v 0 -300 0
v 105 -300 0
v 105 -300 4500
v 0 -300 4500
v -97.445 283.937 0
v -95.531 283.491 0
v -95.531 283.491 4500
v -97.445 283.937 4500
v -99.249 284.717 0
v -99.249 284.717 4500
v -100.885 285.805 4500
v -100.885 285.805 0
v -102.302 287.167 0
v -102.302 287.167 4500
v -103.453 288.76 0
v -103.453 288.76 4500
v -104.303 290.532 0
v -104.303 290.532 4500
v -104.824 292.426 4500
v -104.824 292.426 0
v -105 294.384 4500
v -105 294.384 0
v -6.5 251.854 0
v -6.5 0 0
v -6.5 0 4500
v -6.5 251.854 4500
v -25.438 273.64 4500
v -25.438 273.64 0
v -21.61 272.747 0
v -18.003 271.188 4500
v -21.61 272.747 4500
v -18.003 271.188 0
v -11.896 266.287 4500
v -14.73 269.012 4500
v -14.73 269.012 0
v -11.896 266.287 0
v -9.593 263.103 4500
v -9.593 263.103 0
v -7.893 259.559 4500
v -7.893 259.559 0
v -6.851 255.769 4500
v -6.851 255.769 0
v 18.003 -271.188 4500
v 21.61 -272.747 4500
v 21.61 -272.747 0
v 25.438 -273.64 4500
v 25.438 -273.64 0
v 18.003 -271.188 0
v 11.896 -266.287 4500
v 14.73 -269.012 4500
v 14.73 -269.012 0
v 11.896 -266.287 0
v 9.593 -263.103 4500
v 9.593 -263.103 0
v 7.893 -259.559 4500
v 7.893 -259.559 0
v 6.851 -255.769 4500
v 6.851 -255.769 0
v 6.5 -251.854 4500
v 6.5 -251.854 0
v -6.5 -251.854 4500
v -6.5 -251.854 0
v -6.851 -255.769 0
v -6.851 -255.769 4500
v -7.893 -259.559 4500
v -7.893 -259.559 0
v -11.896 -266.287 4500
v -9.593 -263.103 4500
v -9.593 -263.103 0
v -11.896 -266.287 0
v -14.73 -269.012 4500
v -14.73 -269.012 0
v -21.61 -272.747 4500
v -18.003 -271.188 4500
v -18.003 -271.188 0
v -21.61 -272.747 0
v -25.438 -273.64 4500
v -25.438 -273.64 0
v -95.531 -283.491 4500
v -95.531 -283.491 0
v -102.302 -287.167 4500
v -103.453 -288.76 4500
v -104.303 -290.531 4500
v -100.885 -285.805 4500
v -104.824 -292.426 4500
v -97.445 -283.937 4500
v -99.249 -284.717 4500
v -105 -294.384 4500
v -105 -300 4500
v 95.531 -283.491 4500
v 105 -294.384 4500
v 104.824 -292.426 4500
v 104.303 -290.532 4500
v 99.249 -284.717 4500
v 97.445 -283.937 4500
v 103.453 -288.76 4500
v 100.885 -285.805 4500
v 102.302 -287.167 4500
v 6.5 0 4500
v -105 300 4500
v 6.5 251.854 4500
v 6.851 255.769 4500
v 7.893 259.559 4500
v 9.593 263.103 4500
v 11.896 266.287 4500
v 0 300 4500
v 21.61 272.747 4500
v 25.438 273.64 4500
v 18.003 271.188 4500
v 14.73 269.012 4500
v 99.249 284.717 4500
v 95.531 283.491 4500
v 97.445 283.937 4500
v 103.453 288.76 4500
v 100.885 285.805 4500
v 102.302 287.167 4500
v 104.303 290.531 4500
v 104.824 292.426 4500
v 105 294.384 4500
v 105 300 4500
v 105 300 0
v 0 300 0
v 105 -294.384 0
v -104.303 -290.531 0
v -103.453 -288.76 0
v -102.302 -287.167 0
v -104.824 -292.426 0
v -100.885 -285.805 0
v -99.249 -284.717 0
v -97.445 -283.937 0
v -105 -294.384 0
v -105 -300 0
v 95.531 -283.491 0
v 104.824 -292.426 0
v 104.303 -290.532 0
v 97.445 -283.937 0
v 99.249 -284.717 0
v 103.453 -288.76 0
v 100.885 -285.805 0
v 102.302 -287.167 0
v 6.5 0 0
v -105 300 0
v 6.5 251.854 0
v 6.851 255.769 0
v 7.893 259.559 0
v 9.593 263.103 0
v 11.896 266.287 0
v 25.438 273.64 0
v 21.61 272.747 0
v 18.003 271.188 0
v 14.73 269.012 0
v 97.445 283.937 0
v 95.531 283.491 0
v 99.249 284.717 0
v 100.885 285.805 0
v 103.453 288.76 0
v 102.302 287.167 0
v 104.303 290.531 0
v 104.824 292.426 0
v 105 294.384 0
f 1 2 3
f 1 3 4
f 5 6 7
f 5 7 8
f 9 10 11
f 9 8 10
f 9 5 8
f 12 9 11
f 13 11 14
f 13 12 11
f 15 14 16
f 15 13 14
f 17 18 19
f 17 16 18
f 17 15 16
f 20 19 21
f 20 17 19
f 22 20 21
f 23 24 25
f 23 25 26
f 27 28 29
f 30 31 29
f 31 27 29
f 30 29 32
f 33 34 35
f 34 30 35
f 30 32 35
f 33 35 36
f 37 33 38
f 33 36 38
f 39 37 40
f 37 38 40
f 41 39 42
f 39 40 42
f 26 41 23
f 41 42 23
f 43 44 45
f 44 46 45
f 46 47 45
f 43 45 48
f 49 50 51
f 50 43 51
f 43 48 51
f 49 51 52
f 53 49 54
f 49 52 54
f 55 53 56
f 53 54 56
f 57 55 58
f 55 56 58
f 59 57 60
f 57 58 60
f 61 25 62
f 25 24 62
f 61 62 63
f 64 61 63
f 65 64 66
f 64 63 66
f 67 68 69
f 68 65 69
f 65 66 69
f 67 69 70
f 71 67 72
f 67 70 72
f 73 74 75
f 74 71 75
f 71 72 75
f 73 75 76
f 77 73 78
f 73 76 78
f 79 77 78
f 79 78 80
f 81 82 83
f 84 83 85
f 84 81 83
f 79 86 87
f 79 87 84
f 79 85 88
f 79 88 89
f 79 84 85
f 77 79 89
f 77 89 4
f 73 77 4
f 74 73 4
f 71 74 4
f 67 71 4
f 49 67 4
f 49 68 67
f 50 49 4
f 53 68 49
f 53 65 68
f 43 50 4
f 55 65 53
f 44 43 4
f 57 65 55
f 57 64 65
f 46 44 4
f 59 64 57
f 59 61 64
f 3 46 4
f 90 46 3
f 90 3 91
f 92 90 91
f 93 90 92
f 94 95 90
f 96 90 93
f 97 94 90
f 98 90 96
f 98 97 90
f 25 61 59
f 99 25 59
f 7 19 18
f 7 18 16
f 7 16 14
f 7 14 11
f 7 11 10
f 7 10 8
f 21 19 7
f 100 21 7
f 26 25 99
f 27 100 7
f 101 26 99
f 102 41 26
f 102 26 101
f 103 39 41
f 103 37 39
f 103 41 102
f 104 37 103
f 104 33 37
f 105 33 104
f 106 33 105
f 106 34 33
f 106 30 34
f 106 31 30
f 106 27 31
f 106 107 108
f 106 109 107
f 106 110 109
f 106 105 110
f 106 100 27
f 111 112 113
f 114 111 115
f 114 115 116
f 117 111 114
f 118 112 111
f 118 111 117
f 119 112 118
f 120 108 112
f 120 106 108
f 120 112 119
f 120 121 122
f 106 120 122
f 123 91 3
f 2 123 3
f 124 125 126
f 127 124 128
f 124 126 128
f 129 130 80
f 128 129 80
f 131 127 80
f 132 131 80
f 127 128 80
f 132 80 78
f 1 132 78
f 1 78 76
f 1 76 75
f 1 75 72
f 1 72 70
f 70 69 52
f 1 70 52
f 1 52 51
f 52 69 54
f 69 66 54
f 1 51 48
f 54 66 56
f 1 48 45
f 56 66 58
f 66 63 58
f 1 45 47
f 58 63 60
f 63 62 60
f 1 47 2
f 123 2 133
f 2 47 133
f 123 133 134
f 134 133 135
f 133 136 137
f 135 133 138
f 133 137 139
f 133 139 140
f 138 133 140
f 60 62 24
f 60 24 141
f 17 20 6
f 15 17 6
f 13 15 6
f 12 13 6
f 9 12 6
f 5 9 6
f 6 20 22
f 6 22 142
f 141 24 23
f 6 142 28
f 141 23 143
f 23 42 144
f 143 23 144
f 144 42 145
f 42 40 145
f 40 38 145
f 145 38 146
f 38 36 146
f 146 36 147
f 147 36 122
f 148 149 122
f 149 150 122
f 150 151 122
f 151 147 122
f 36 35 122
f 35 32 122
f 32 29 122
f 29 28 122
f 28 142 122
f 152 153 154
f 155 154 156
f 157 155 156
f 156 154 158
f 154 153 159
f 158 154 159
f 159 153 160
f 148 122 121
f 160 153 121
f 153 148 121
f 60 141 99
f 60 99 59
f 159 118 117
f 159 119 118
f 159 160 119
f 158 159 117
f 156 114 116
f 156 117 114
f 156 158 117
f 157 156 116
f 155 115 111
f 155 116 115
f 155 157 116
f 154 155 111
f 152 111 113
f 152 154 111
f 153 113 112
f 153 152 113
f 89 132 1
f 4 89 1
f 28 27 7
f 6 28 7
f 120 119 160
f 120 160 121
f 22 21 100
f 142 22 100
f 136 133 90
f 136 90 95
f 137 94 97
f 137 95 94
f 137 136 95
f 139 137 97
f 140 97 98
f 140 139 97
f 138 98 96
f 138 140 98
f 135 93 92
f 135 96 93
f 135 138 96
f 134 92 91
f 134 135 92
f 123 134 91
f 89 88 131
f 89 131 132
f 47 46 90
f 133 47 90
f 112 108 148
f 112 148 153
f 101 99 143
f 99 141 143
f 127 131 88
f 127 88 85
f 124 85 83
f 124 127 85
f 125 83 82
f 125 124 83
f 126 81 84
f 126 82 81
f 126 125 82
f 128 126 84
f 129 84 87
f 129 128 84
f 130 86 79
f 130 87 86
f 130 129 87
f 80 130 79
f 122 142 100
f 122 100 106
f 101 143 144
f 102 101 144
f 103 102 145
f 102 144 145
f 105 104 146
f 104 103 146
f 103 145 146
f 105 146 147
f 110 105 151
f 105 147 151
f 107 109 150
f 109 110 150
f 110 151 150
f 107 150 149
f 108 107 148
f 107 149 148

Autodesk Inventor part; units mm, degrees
ref_plane "YZ Plane" through (0, 0, 0) normal (1, 0, 0) x (0, 1, 0)
ref_plane "Startebene" through (0, 0, 0) normal (0, 0, 1) x (1, 0, 0)
ref_plane "Endebene" through (0, 0, 4500) normal (0, 0, 1) x (1, 0, 0)
sketch "Skizze" plane through (0, 0, 0) normal (0, 0, 1) x (1, 0, 0)
  line L0 (-6.5, 0) -> (-6.5, -251.8541)
  line L1 (-25.4382, -273.64) -> (-95.5309, -283.4908)
  line L2 (-105, -294.3838) -> (-105, -300)
  line L3 (-105, -300) -> (0, -300)
  line L4 (-55.75, -300) -> (-55.75, -277.9) construction
  line L5 (-25.7112, 0) -> (34.2816, 0) construction
  line L6 (0, 40) -> (0, -300) construction
  line L7 (0, -48) -> (0, 64) construction
  line L8 (6.5, 0) -> (6.5, -251.8541)
  line L9 (25.4382, -273.64) -> (95.5309, -283.4908)
  line L10 (105, -294.3838) -> (105, -300)
  line L11 (105, -300) -> (0, -300)
  line L12 (-6.5, 0) -> (6.5, 0) construction
  line L13 (-6.5, 0) -> (-6.5, 251.8541)
  line L14 (-25.4382, 273.64) -> (-95.5309, 283.4908)
  line L15 (-105, 294.3838) -> (-105, 300)
  line L16 (-105, 300) -> (0, 300)
  line L17 (6.5, 0) -> (6.5, 251.8541)
  line L18 (25.4382, 273.64) -> (95.5309, 283.4908)
  line L19 (105, 294.3838) -> (105, 300)
  line L20 (105, 300) -> (0, 300)
  arc A0 (-105, 294.3838) -> (-95.5309, 283.4908) centre (-94, 294.3838) ccw
  arc A1 (95.5309, 283.4908) -> (105, 294.3838) centre (94, 294.3838) ccw
  arc A2 (105, -294.3838) -> (95.5309, -283.4908) centre (94, -294.3838) ccw
  arc A3 (-95.5309, -283.4908) -> (-105, -294.3838) centre (-94, -294.3838) ccw
  arc A4 (-6.5, 251.8541) -> (-25.4382, 273.64) centre (-28.5, 251.8541) ccw
  arc A5 (25.4382, 273.64) -> (6.5, 251.8541) centre (28.5, 251.8541) ccw
  arc A6 (6.5, -251.8541) -> (25.4382, -273.64) centre (28.5, -251.8541) ccw
  arc A7 (-25.4382, -273.64) -> (-6.5, -251.8541) centre (-28.5, -251.8541) ccw
  line L21 (0, 420) -> (0, -420) construction
  line L22 (-149.8509, 0) -> (149.8509, 0) construction
  point P0 (-6.5, -270.9784)
  point P1 (-105, -284.8216)
  point P2 (6.5, -270.9784)
  point P3 (105, -284.8216)
  point P4 (55.75, -300)
  point P5 (55.75, -277.9)
  point P6 (-6.5, 270.9784)
  point P7 (-105, 284.8216)
  point P8 (-55.75, 300)
  point P9 (-55.75, 277.9)
  point P10 (6.5, 270.9784)
  point P11 (105, 284.8216)
  point P12 (55.75, 277.9)
  point P13 (55.75, 300)
  dimension "d1" = 6.9216
  dimension "d2" = 22.1
  dimension "d3" = 49.25
  dimension "d4" = 6.5
  dimension "d5" = 105
  dimension "d10" = 300
  dimension "d14" = 11
  dimension "d15" = 22
extrude "Körper" add sketch "Skizze" along normal up to surface (4500 mm away) from surface at 0
sketch "Sketch3" plane through (0, 0, 0) normal (0, 0, 1) x (1, 0, 0)
  line L0 (0, 0) -> (10, 0)
ref_plane "Work Plane3" through (0, 0, 0) normal (0, -1, 0) x (1, 0, 0)
sketch "Sketch4" plane through (0, 0, 0) normal (0, -1, 0) x (1, 0, 0)
  line L0 (-2, 0) -> (12, 0)
  line L1 (-2, 4500) -> (12, 4500)
  dimension "d19" = 4500
equation "\"d2\" = G_T1"
equation "\"d3\" = G_C"
equation "\"d4\" = 0.5 * G_T"
equation "\"d5\" = 0.5 * G_W"
equation "\"d10\" = 0.5 * G_H"
equation "\"d14\" = G_ER"
equation "\"d15\" = G_IR"
equation "\"d6\" = G_L"
equation "\"G_W\" = 210"
equation "\"G_H\" = 600"
equation "\"G_T\" = 13"
equation "\"G_T1\" = 22.1"
equation "\"G_C\" = 49.25"
equation "\"G_NG\" = 0.140541"
equation "\"G_L\" = d19"
equation "\"G_ER\" = 0.5 * G_IR"
equation "\"G_IR\" = 22"
equation "\"G_OFFSET_START\" = 0"
equation "\"G_OFFSET_END\" = 0"
properties part number "ISO 657/15 - SB 600x131 - 4500" material "Stahl, weich"
